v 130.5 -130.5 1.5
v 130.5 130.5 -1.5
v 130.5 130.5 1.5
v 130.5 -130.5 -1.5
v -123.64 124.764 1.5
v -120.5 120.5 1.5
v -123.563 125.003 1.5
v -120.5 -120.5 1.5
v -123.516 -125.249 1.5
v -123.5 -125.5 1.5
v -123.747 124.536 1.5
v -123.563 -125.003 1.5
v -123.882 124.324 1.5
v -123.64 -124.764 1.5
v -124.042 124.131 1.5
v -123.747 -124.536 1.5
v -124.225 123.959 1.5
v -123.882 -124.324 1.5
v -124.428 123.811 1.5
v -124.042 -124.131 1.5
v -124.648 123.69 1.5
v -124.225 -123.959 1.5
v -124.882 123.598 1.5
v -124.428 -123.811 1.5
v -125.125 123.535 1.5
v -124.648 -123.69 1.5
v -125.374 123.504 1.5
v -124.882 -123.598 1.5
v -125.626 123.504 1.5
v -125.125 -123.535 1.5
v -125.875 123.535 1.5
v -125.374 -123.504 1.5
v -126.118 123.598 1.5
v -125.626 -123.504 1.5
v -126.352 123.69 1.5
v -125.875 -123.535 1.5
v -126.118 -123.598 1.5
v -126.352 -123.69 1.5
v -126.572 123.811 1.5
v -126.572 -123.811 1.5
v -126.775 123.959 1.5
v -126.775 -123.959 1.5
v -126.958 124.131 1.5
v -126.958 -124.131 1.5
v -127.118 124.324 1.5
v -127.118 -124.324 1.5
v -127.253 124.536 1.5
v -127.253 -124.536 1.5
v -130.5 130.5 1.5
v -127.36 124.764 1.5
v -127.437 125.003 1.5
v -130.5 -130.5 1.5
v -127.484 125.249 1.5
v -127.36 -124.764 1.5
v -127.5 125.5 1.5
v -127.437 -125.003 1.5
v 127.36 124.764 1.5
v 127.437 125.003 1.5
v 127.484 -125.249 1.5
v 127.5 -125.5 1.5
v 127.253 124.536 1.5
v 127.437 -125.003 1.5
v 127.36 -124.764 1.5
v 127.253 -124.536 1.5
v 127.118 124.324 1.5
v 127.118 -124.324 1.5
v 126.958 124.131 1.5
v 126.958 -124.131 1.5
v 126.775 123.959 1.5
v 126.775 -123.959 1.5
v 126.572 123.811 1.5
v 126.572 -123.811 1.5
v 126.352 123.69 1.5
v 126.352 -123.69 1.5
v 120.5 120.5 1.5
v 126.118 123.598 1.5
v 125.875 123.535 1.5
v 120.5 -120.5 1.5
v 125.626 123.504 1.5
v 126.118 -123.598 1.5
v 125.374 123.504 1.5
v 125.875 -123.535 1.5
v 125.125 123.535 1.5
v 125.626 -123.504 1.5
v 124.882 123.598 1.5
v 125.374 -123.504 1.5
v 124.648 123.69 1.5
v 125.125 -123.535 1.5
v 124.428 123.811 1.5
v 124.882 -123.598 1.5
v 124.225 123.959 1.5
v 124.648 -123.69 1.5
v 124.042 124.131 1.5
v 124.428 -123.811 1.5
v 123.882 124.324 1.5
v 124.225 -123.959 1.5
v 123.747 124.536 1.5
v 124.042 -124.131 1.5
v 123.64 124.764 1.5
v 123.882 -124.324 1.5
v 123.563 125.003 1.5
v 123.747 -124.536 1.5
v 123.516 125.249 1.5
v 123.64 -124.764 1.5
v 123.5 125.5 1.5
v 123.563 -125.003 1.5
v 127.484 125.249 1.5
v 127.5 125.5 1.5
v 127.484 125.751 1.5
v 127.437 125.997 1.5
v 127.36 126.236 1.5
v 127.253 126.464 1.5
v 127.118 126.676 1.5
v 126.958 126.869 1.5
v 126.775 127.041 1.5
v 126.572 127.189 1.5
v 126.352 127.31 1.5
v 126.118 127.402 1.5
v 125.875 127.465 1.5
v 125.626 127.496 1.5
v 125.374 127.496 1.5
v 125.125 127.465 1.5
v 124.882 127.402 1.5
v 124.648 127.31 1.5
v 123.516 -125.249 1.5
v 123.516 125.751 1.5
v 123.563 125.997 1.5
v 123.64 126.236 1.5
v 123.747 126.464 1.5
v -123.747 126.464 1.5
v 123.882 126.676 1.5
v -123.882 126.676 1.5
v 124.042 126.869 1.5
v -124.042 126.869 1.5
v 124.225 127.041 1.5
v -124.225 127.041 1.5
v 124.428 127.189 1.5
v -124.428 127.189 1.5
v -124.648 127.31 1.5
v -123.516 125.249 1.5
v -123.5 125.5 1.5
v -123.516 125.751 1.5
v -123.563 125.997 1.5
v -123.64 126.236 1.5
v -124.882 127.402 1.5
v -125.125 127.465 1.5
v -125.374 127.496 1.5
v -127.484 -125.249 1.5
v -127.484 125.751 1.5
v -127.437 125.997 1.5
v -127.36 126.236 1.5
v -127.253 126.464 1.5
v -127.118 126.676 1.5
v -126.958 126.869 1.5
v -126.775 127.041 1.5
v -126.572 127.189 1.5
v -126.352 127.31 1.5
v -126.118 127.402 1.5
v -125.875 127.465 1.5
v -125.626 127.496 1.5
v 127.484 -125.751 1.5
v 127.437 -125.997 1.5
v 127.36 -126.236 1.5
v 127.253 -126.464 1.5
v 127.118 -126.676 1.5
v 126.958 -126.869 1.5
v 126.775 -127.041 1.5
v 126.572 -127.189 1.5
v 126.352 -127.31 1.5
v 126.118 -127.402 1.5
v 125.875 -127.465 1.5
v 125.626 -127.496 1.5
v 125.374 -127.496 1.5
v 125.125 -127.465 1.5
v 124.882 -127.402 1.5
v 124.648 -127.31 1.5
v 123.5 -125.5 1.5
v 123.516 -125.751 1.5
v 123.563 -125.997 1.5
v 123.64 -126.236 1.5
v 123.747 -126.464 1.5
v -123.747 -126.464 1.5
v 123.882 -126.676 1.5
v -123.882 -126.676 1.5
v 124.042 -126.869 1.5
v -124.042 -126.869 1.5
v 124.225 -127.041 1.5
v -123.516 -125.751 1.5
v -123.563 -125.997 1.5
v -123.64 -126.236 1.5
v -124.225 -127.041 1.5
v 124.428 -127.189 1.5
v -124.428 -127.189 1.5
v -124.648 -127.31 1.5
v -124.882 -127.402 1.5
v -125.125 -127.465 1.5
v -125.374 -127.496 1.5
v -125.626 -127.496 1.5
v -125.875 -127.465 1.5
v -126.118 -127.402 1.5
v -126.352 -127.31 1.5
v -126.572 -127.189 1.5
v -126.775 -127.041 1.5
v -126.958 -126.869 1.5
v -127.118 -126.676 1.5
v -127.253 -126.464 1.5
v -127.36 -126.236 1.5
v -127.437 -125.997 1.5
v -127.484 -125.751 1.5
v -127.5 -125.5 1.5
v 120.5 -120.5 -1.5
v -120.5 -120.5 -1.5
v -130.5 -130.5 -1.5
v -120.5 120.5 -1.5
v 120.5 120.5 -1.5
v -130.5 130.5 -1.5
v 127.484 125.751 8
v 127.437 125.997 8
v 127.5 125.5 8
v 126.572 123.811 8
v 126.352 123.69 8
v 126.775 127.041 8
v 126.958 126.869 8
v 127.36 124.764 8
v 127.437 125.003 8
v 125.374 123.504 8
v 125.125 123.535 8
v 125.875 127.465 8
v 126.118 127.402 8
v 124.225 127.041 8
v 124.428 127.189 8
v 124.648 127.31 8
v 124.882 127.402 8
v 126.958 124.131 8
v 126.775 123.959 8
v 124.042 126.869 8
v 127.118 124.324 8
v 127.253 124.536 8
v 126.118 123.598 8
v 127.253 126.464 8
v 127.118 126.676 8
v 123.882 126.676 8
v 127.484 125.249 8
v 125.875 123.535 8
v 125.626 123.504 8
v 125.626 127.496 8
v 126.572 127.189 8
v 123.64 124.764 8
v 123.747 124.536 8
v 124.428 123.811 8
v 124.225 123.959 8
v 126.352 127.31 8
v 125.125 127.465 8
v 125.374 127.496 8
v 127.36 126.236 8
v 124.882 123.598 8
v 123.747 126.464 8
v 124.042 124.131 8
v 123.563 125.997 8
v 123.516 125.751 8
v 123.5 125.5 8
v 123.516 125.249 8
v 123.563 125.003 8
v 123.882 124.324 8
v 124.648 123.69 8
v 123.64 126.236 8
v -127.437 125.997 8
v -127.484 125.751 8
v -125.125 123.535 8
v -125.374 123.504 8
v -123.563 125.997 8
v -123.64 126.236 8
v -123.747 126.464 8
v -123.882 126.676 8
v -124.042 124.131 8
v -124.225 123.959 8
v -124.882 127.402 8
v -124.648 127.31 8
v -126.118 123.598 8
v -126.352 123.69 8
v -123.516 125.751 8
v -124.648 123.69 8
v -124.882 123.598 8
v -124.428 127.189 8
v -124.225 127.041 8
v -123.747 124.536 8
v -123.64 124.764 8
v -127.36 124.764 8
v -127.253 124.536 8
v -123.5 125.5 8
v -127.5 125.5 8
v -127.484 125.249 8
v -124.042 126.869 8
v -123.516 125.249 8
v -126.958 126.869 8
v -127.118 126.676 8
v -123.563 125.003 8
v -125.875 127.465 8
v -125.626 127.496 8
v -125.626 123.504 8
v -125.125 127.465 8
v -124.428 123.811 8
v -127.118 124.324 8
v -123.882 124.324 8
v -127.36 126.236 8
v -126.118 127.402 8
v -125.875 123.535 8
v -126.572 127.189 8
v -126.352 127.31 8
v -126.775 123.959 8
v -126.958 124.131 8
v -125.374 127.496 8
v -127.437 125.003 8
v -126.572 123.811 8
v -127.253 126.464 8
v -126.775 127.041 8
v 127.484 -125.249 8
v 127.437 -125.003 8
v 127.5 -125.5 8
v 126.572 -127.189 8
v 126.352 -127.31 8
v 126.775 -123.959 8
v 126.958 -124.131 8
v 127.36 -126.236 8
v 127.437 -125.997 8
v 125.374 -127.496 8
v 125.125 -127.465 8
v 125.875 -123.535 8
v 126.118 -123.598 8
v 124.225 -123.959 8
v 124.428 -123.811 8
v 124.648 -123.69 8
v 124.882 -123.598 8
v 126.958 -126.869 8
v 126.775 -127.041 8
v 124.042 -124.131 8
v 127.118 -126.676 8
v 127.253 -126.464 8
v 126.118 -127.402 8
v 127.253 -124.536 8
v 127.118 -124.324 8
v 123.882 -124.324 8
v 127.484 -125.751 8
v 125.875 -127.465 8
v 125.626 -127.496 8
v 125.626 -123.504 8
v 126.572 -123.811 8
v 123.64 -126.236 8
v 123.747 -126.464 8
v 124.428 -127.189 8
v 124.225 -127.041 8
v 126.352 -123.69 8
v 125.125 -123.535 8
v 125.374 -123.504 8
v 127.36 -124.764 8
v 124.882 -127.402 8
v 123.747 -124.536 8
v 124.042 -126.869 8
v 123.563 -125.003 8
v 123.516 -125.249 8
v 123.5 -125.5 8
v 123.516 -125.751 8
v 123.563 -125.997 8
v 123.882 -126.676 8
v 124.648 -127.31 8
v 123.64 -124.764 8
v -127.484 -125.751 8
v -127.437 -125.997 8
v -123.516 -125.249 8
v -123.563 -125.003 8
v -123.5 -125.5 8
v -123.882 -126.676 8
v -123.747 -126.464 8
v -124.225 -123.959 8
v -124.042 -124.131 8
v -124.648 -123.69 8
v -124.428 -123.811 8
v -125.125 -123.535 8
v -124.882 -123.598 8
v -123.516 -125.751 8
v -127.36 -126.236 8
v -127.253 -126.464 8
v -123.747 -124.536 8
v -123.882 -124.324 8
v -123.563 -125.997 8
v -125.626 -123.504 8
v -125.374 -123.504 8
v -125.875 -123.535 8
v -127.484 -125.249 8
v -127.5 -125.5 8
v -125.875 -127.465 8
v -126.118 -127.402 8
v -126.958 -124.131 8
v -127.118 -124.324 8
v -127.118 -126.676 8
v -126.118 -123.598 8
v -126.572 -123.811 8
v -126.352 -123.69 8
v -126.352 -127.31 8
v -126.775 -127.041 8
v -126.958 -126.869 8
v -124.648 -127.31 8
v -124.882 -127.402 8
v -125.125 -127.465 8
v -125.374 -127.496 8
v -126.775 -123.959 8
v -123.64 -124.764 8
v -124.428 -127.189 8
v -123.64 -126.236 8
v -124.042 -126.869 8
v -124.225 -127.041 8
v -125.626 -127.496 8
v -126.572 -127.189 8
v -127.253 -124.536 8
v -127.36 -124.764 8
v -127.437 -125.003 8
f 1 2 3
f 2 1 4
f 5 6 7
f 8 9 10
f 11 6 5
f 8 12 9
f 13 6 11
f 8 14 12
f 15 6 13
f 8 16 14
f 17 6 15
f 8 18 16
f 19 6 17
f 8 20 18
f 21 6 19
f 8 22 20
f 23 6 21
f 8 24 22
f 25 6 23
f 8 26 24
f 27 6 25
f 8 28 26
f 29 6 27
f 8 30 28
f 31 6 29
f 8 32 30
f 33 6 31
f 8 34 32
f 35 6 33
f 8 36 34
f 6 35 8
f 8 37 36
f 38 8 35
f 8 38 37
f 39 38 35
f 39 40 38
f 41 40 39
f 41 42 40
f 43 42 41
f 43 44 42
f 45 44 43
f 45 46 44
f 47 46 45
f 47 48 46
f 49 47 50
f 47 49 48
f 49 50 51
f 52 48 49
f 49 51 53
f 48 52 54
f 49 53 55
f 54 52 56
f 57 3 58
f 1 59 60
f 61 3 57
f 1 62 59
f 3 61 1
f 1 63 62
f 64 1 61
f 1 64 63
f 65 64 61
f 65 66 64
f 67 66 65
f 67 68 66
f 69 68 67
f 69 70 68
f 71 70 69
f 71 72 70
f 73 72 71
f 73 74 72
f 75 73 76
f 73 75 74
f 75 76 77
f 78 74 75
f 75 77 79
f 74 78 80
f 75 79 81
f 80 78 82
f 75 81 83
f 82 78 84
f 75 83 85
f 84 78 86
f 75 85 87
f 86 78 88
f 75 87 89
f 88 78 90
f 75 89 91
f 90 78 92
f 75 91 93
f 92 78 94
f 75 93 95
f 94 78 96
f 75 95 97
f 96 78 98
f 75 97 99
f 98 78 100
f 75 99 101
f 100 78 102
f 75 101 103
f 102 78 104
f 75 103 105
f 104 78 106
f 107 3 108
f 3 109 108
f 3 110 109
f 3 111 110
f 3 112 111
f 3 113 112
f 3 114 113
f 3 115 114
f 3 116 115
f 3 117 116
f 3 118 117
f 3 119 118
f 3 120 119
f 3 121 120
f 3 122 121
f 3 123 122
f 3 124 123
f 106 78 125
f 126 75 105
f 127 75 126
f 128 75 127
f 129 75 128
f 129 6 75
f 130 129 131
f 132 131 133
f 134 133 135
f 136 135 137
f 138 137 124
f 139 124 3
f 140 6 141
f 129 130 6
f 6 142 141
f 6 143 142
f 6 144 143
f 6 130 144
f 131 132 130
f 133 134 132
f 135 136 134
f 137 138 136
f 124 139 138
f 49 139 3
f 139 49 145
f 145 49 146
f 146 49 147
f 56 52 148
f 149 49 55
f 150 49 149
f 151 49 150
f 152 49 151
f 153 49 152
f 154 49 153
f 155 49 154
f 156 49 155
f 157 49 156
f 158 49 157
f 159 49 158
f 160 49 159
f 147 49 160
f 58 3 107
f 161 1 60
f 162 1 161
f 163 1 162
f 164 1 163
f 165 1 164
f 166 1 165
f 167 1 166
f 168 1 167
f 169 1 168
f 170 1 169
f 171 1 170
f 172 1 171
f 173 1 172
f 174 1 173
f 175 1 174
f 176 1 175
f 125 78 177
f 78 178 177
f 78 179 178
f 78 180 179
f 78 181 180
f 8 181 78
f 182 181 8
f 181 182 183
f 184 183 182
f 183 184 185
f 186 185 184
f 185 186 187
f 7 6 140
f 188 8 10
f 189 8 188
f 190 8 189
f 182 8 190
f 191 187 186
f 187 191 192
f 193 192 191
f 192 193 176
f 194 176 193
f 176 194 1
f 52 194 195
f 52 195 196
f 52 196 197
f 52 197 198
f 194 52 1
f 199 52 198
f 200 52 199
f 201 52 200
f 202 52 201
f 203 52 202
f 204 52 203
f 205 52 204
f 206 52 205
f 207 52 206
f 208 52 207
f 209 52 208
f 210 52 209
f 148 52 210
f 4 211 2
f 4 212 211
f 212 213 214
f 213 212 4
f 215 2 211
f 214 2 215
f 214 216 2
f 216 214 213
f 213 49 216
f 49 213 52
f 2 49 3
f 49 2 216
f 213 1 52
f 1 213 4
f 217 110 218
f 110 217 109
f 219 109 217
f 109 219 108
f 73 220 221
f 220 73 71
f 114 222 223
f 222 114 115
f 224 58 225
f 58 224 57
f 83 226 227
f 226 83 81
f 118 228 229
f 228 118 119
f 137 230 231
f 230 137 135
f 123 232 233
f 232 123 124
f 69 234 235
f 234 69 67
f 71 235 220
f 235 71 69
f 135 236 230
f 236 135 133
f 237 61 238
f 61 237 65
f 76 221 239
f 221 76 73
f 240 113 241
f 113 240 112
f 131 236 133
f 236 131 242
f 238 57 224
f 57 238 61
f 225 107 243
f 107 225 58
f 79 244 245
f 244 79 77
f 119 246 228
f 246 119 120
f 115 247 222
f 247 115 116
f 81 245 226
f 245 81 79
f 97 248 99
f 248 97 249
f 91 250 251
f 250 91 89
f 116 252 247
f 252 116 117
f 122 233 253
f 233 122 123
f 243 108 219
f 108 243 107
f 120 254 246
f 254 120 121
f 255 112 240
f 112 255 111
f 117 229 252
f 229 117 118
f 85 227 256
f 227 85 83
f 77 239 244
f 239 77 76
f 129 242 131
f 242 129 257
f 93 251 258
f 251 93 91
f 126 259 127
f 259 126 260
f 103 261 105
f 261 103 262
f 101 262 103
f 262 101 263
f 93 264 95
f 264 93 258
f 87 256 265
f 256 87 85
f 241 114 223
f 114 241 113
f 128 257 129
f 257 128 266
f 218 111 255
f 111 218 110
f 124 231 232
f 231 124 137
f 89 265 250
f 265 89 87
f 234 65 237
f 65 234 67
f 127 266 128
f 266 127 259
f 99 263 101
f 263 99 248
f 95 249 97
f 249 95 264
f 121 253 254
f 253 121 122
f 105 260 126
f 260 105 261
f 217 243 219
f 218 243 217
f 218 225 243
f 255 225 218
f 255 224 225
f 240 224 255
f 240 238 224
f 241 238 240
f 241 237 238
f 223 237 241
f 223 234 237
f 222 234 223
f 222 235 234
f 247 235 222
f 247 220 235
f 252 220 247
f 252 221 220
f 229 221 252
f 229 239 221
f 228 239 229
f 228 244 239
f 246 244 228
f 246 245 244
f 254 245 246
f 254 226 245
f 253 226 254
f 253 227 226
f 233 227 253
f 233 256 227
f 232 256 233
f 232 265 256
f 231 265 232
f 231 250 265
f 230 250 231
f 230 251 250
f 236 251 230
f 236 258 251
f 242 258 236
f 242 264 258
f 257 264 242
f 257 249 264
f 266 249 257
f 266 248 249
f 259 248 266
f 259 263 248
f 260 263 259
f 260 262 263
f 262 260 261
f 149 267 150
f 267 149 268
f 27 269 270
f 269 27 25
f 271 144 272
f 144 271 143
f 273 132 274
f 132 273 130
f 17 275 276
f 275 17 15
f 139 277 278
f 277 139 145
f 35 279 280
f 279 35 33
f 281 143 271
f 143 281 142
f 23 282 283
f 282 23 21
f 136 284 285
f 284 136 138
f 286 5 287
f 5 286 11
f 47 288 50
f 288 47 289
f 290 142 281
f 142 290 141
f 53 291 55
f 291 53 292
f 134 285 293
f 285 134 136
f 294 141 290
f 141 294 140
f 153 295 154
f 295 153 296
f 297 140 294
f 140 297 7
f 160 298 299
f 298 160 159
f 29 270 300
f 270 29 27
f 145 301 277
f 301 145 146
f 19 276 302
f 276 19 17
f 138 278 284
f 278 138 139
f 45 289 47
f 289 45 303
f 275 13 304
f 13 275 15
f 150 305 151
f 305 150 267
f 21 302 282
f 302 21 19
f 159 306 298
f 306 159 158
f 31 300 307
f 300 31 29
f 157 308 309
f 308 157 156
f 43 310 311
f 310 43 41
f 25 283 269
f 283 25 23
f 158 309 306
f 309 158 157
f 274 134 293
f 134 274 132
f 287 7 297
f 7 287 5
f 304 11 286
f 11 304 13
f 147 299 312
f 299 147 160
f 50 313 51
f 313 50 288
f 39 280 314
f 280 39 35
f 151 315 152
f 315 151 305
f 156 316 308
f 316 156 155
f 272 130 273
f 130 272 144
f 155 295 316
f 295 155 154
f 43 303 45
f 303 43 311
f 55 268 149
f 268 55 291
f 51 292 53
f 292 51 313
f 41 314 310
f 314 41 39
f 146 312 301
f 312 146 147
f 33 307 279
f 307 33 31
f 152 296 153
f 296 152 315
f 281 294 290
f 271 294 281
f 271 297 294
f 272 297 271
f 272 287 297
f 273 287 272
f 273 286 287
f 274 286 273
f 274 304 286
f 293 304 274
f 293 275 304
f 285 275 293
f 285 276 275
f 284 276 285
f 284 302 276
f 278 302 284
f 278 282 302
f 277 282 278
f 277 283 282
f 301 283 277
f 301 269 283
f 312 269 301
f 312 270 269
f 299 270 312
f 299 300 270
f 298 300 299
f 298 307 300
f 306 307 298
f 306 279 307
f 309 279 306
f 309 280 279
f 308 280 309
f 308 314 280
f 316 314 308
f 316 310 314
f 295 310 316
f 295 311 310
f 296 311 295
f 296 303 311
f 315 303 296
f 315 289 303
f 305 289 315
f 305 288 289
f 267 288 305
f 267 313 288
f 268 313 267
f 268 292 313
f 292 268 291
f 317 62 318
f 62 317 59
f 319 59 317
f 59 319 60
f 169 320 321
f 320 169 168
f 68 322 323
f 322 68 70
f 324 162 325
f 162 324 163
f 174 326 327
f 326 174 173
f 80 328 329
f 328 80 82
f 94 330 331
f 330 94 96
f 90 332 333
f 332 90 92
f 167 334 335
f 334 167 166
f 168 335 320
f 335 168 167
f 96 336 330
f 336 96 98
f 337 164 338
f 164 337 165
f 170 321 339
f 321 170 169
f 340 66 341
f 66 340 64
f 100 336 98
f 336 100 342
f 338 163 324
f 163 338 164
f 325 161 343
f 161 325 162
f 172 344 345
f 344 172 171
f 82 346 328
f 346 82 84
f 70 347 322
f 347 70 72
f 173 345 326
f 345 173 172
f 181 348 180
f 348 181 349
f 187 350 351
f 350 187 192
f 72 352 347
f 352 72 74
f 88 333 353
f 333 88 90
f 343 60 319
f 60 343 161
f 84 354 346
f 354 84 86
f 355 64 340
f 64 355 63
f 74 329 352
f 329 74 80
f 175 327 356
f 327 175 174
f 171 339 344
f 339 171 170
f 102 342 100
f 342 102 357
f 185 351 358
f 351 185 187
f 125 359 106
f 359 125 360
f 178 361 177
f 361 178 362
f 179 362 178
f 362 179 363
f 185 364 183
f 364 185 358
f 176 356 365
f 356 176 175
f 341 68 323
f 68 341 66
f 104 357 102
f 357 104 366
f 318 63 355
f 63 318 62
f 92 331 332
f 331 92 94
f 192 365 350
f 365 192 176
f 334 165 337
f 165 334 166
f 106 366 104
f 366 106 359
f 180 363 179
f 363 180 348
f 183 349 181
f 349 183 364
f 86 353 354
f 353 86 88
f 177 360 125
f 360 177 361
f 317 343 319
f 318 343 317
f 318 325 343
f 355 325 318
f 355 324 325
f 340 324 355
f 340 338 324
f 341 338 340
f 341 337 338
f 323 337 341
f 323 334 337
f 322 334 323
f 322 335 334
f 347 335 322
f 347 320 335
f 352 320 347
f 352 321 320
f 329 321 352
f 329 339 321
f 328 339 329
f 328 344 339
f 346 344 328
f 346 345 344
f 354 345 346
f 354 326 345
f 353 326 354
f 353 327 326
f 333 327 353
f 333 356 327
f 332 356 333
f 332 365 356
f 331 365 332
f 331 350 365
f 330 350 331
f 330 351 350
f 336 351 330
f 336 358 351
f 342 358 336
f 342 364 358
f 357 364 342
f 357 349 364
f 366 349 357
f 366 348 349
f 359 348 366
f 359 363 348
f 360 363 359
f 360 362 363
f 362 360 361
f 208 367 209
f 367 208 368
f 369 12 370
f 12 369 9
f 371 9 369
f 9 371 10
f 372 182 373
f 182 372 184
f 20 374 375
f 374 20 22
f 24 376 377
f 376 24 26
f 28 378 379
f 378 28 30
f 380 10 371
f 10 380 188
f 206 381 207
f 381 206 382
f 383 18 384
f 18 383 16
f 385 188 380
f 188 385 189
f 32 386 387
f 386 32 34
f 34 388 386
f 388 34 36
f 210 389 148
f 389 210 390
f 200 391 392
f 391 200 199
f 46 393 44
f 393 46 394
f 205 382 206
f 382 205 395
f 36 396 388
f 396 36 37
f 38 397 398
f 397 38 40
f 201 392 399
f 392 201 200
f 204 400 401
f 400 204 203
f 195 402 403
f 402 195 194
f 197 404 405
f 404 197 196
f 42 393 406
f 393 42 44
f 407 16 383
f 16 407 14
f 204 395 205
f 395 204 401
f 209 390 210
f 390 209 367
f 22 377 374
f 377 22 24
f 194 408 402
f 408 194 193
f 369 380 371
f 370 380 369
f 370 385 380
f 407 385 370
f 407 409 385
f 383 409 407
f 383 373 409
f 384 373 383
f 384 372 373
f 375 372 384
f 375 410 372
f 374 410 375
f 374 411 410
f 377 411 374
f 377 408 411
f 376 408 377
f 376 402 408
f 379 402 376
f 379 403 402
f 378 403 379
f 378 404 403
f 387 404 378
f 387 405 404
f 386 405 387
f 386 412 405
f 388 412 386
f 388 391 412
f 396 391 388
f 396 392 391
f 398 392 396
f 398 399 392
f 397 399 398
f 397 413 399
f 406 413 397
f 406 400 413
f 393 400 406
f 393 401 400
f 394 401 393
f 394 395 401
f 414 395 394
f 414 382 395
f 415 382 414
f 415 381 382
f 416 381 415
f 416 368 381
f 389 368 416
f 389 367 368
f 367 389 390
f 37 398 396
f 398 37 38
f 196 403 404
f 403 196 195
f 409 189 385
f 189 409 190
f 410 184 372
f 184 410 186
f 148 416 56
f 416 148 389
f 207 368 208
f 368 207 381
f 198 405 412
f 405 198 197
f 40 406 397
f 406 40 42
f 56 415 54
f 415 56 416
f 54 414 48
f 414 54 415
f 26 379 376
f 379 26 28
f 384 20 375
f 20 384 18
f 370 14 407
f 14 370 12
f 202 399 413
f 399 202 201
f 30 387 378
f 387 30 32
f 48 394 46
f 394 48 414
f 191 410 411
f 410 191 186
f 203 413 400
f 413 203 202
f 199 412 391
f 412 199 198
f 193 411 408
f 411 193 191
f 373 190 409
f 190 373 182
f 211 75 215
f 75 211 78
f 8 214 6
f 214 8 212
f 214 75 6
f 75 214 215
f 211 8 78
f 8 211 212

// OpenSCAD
// overall size of the frame
frameLength = 261;
frameWidth = 261;

// thickness and width of frame
frameHeight = 3;
frameInset = 10;

// dimensions of pins on each corner
pinHeight = 7;
pinDiameter = 4;
pinResolution = 50;

// pins are in middle of the frame on each corner
pinX = (frameWidth / 2) - (frameInset / 2);
pinY = (frameLength / 2 - (frameInset / 2));
pinZ = frameHeight - 2;

difference() {
    
    // outer frame with pins
    union() {
        cube(size=[frameWidth, frameLength, frameHeight], center=true);
        
        translate([pinX, pinY, pinZ]) 
        cylinder(h=pinHeight, d=pinDiameter, $fn=pinResolution);
        
        translate([-pinX, pinY, pinZ]) 
        cylinder(h=pinHeight, d=pinDiameter, $fn=pinResolution);
        
        translate([pinX, -pinY, pinZ]) 
        cylinder(h=pinHeight, d=pinDiameter, $fn=pinResolution);
        
        translate([-pinX, -pinY, pinZ]) 
        cylinder(h=pinHeight, d=pinDiameter, $fn=pinResolution);
    }
    
    // cut out the center
    cube(size=[frameWidth - (frameInset * 2), 
            frameLength - (frameInset * 2), 
            frameHeight + 1], 
        center=true
    );
}
